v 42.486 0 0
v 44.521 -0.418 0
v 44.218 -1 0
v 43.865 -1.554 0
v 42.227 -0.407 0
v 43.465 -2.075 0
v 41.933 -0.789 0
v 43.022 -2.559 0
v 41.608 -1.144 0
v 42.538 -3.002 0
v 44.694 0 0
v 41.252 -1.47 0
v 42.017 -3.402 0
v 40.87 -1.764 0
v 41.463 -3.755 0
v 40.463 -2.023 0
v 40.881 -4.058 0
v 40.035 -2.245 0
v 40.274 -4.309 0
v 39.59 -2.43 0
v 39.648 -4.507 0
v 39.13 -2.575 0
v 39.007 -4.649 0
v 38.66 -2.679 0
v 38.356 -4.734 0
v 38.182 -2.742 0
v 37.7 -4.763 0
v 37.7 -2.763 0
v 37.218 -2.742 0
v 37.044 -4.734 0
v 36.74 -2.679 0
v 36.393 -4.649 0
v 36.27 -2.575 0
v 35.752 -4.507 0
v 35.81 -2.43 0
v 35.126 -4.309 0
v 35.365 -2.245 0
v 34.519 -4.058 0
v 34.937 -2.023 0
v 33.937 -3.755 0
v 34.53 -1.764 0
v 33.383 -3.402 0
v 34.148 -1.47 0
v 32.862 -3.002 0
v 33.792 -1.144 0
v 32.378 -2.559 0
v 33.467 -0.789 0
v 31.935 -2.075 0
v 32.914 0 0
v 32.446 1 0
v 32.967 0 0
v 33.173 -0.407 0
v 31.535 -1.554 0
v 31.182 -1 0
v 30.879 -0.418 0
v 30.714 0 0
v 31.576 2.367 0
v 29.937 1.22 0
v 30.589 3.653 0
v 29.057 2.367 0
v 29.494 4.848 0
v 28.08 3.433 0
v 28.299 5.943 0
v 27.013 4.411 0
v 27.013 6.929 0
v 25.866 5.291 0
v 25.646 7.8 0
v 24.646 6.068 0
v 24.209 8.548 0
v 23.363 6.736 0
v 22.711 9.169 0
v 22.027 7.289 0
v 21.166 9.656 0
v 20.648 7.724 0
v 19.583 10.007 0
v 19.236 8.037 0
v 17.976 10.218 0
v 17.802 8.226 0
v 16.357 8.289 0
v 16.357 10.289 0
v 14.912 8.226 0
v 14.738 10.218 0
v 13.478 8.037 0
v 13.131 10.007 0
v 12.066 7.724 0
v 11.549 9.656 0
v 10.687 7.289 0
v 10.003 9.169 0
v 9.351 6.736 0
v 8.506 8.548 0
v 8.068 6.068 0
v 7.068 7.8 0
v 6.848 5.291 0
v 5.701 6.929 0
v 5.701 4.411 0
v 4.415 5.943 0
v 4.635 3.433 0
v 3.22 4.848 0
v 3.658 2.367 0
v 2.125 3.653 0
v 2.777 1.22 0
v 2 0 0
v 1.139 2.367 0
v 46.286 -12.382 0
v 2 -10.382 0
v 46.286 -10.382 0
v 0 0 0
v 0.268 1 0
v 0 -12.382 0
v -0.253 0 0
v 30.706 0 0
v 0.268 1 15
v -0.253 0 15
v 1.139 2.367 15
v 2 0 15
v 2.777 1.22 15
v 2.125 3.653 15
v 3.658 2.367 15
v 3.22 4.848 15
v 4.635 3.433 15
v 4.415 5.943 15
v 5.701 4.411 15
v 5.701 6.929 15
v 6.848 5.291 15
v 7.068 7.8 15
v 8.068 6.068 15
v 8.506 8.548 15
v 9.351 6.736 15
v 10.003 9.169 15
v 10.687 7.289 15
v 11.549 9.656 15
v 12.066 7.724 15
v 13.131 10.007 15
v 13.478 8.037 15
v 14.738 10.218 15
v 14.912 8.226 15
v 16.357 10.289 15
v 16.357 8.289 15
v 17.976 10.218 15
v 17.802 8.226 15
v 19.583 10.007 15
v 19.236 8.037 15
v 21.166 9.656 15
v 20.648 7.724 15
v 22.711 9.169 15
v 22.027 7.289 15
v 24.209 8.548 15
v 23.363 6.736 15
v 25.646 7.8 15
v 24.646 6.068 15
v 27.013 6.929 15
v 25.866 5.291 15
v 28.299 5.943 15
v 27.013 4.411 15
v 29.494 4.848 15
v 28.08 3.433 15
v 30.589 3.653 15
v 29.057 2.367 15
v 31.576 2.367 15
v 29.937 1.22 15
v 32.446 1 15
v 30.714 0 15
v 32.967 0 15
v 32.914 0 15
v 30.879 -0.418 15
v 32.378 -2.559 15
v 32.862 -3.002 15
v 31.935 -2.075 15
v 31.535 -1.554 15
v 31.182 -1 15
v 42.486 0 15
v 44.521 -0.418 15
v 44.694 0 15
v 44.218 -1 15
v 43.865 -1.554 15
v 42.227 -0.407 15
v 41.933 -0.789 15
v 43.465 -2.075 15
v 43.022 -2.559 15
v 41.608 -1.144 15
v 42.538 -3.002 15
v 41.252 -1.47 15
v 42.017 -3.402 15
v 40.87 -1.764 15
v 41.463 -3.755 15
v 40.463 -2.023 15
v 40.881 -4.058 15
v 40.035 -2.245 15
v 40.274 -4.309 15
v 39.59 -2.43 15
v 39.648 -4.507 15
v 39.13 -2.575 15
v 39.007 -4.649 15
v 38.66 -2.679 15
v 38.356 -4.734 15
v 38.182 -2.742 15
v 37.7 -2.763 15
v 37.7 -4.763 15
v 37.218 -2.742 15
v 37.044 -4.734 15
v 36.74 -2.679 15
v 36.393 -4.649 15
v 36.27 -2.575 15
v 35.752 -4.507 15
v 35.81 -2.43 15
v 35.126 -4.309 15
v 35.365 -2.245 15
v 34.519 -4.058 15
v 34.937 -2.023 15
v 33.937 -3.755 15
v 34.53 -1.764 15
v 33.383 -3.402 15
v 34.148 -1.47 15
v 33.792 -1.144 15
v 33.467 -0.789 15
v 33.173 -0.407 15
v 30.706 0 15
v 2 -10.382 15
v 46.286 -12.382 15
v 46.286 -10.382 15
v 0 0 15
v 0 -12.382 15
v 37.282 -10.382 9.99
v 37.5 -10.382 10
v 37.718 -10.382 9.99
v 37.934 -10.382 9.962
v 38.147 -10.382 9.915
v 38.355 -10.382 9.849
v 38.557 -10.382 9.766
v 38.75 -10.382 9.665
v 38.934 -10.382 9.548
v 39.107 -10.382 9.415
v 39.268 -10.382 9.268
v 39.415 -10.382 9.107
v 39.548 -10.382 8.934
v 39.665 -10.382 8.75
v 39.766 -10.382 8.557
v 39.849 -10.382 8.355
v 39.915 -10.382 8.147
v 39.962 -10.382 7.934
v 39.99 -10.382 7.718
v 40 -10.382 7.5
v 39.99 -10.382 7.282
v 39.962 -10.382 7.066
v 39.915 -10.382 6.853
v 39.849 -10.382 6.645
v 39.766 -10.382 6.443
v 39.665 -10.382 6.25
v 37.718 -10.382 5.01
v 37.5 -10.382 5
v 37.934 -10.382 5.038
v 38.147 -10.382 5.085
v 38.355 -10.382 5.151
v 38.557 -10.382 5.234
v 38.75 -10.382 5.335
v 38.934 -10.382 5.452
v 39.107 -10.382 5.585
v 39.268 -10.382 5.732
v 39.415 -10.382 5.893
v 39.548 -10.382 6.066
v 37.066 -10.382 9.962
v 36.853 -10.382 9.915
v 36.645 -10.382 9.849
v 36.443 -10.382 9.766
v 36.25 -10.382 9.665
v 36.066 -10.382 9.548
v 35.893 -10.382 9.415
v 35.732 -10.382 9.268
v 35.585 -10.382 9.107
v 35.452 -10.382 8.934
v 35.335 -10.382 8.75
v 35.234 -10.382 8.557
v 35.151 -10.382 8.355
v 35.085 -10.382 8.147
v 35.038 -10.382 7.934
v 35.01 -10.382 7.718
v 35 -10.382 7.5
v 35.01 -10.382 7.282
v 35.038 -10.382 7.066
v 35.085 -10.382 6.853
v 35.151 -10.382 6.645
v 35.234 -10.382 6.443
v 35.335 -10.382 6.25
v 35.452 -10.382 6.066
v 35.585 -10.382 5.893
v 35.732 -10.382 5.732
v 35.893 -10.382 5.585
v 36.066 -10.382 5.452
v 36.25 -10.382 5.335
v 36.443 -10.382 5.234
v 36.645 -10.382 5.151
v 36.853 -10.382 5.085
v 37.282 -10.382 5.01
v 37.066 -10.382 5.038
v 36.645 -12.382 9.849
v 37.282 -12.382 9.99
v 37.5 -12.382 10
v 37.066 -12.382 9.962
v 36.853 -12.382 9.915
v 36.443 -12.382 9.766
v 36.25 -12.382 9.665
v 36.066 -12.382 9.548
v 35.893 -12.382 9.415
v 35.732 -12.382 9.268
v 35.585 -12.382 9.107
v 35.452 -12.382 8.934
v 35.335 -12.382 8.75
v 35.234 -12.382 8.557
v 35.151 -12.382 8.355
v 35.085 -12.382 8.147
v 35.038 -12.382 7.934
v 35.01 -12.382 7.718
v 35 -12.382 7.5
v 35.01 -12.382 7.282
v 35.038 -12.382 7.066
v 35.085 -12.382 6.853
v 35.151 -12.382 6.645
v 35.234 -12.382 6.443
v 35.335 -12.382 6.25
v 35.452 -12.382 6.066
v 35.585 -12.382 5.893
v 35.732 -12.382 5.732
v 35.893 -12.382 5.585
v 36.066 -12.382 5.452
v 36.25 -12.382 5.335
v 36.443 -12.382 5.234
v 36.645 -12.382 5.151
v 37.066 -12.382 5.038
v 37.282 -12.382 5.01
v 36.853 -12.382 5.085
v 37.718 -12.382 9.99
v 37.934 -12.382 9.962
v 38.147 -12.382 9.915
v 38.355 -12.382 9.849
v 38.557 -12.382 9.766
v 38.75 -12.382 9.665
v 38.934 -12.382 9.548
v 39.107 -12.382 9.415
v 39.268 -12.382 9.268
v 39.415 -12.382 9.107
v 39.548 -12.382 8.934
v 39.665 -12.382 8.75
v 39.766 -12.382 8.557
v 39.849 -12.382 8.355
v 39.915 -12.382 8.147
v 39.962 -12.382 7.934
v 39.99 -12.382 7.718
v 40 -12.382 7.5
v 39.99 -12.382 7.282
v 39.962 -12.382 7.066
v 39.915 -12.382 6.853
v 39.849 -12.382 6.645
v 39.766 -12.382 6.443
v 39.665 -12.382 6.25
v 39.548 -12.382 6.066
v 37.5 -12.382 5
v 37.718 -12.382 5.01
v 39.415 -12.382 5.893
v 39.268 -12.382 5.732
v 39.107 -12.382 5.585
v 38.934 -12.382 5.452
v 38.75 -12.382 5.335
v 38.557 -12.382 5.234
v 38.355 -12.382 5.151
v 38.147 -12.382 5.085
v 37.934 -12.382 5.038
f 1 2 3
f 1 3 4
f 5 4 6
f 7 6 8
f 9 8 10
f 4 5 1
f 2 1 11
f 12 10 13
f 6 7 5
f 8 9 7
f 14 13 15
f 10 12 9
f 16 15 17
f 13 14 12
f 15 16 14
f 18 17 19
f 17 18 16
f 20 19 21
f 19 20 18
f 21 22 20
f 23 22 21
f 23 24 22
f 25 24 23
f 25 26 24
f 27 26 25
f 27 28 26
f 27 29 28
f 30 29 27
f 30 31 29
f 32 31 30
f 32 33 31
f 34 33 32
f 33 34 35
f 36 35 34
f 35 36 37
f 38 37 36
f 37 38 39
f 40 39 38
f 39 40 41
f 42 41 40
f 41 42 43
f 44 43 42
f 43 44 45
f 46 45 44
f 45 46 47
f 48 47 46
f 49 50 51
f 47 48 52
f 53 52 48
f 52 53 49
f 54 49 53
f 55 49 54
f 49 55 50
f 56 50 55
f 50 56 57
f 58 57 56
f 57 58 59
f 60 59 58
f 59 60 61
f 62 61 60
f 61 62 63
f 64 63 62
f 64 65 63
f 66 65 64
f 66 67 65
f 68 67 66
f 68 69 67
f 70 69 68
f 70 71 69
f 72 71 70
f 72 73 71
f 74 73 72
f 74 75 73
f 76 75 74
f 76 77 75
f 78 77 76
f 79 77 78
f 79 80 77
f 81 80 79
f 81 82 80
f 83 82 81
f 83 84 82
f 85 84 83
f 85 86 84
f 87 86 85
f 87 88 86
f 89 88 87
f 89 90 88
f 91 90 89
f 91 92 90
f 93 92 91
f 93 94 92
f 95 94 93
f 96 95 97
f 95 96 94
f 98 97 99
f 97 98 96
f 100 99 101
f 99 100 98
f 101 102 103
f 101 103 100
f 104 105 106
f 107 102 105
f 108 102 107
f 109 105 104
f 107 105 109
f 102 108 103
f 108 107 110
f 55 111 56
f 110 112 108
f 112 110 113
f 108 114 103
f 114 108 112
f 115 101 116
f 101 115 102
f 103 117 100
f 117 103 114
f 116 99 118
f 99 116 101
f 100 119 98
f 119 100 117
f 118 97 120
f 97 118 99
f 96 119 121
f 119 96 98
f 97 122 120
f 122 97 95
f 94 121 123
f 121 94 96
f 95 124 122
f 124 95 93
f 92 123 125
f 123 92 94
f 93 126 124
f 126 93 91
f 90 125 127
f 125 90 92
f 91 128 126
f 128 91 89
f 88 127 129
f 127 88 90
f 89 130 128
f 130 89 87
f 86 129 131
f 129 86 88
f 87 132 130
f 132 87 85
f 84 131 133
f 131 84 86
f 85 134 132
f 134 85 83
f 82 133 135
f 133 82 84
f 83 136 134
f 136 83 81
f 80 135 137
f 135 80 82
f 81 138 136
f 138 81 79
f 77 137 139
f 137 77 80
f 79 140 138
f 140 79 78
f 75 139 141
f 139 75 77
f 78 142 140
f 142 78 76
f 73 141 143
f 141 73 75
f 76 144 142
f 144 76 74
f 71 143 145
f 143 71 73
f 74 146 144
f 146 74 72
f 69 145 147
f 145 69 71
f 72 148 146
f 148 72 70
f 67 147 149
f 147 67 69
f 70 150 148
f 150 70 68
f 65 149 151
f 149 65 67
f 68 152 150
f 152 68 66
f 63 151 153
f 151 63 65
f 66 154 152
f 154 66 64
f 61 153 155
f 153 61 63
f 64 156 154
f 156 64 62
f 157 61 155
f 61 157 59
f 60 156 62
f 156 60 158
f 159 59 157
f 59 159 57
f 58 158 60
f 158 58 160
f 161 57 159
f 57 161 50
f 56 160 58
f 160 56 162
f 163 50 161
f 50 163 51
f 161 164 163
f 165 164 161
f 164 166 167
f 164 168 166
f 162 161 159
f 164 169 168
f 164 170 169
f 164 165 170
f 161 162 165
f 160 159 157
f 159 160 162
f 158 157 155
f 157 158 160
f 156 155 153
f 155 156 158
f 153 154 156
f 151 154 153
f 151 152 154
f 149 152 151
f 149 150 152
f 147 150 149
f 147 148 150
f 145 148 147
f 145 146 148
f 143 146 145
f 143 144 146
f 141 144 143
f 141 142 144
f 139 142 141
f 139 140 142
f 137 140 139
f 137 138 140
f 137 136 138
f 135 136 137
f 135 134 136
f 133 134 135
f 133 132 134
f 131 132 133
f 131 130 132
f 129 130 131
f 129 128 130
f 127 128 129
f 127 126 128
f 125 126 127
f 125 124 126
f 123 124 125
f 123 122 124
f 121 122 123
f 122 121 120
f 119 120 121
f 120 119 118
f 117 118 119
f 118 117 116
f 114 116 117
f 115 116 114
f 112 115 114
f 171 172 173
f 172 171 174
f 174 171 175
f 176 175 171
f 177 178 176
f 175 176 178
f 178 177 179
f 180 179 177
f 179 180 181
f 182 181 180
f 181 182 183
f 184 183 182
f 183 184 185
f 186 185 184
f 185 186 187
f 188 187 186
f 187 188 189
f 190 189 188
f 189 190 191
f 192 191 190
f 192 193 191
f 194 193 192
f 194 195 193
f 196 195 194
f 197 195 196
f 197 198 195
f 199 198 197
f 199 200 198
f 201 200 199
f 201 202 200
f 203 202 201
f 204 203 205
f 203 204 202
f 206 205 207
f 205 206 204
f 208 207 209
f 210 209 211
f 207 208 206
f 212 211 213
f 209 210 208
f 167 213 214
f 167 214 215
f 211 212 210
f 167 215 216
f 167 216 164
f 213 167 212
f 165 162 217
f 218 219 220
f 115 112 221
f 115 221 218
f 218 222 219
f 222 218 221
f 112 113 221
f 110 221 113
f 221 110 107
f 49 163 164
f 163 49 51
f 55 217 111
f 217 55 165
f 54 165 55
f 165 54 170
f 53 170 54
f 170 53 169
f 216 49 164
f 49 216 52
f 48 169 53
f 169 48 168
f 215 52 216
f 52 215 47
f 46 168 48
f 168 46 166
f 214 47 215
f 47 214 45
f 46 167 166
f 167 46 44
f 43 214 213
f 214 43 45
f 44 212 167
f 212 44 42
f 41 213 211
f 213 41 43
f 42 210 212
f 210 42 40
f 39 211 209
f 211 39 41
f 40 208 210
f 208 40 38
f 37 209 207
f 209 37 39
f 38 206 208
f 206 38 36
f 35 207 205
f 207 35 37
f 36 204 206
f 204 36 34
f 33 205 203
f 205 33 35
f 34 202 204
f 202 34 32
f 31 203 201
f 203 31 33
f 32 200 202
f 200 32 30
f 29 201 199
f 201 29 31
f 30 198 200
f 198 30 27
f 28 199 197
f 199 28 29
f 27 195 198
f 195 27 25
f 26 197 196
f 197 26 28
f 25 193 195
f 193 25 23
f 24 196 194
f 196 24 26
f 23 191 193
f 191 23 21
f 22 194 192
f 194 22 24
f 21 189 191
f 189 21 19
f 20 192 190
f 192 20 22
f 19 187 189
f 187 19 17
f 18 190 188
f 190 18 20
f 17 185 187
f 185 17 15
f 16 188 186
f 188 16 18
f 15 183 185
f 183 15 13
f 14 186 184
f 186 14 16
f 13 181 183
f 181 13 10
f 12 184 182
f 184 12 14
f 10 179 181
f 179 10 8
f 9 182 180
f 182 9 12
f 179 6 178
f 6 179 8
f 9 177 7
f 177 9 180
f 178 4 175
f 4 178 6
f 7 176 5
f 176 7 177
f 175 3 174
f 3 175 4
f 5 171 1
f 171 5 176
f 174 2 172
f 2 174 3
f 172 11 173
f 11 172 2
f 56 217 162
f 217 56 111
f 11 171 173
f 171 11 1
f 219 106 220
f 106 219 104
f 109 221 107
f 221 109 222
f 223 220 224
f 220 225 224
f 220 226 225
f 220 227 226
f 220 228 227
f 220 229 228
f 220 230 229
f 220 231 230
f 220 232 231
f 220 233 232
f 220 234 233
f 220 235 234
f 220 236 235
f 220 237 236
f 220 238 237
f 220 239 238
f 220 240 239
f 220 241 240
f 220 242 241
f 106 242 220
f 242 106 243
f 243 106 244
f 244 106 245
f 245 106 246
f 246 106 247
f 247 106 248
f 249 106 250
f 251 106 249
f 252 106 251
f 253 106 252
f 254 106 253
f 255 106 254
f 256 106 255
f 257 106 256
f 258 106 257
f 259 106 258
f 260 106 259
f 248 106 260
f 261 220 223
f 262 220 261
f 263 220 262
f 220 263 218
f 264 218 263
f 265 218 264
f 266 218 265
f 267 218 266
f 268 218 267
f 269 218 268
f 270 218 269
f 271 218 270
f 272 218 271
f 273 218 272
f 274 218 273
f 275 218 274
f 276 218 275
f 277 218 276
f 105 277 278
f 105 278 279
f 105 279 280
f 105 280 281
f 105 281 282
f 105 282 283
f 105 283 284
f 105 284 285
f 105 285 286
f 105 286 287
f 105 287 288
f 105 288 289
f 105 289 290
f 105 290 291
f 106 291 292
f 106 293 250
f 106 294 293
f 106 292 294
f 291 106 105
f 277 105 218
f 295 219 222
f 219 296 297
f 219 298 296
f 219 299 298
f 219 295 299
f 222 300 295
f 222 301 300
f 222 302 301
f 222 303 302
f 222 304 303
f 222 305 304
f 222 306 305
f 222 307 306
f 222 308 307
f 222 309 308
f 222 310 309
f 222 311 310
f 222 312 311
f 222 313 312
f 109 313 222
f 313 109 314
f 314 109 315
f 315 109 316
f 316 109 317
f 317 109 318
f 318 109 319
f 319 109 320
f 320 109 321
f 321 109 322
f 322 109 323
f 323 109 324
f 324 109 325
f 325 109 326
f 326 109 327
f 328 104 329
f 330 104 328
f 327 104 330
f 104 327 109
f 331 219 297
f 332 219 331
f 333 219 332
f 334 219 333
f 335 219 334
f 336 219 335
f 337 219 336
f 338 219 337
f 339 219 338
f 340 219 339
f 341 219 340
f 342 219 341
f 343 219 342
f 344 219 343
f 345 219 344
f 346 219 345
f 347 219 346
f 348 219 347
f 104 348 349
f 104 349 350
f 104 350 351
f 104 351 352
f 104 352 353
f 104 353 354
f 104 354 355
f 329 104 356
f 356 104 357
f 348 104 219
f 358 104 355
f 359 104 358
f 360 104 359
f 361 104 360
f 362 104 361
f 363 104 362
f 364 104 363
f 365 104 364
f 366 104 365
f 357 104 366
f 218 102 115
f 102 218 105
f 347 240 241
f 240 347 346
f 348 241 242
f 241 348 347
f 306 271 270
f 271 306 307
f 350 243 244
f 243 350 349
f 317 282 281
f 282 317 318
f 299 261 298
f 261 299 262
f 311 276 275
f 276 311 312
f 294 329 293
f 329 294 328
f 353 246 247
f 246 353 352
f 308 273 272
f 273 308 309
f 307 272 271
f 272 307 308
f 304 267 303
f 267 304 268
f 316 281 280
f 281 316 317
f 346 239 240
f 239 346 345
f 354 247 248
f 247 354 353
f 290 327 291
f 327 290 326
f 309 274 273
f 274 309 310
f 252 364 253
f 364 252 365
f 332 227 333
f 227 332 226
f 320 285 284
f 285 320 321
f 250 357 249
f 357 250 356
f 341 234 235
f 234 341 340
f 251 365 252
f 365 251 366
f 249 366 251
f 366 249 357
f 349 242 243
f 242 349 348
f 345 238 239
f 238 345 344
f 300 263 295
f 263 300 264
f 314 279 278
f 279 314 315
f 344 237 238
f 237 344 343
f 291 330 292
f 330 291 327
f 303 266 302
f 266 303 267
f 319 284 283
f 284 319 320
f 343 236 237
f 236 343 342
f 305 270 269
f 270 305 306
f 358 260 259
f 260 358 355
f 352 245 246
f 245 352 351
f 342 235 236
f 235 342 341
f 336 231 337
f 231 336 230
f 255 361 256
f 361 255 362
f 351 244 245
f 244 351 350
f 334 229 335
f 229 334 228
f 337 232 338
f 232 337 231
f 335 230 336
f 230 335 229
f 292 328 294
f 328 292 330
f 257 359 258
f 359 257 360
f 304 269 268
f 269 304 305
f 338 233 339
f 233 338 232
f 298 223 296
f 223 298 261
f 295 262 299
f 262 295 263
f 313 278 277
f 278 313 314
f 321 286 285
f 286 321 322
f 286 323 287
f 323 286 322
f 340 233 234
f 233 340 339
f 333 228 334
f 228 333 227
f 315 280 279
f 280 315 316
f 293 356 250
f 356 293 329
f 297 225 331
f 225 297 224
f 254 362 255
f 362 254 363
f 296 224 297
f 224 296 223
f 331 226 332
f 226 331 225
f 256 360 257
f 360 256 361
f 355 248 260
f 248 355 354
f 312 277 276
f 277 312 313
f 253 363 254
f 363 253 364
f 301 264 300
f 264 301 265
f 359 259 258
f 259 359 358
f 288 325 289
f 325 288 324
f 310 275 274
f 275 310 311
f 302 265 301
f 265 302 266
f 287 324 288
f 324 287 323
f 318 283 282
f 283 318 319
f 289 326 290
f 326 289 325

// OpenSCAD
lens_distance = 35.5;
lens_radius = 2.5;
phone_thinkness = 7;

clip(lens_distance, lens_radius, phone_thinkness);

module semi_circle_shell(radius, shell_thickness = 2, shell_height = 15) {
    difference() {
        rotate_extrude(convexity = 10, $fn=72) 
            translate([radius, 0, 0]) 
                square([shell_thickness, shell_height]);
        
        outer_radius = radius + shell_thickness;
        
        translate([-outer_radius, -outer_radius, -1])
            cube([outer_radius * 2, outer_radius, shell_height + 2]);
    }
}

module curve_shell(radius, shell_thickness = 2,  shell_height = 15) {
    mask_thickness = radius * 0.5;
         
    translate([0, -mask_thickness, 0]) difference() {
        semi_circle_shell(radius, shell_thickness, shell_height);
        
        width = radius + shell_thickness;
        
        translate([-width, 0, -shell_thickness / 2]) 
            cube([width * 2, mask_thickness, shell_height + shell_thickness]);
    }   
}

module wave(l1, l2, shell_thickness = 2, shell_height = 15) {
    square_root_of_3 = 1.732050807568877;
    r1 = 2 * l1 / square_root_of_3;
    r2 = 2 * l2 / square_root_of_3;
    
    translate([l2 + shell_thickness, 0, 0]) 
        curve_shell(r2, shell_thickness, shell_height);
        
    mirror([0, 1, 0]) 
        translate([l1 + 2 * (shell_thickness + l2) + 0.2, 0, 0]) 
            curve_shell(r1, shell_thickness, shell_height);
}

module clip(lens_distance, lens_radius, phone_thickness, shell_thickness = 2, shell_height = 15) {
    l1 = (lens_distance - shell_thickness) / 7;
    l2 = 3 * l1;
    
    square_root_of_3 = 1.732050807568877;
    r1 = 2 * l1 / square_root_of_3;
    
    y_offset = r1 * 0.25 + shell_thickness + phone_thickness;   

    difference() {
        union() {
           wave(l1, l2, shell_thickness, shell_height);

           translate([0, -(phone_thickness + r1 * 0.25 + 2 * shell_thickness), 0]) 
               cube([(l1 + l2) * 2 + shell_thickness * 4, shell_thickness, shell_height]);
           
           translate([0, -y_offset, 0]) cube([shell_thickness, y_offset, shell_height]);
        }
        
        translate([lens_distance + shell_thickness, -y_offset + 2, shell_height / 2]) 
            rotate([90, 0, 0]) 
                cylinder(r=lens_radius, h=6, $fn=72);
    }
}

